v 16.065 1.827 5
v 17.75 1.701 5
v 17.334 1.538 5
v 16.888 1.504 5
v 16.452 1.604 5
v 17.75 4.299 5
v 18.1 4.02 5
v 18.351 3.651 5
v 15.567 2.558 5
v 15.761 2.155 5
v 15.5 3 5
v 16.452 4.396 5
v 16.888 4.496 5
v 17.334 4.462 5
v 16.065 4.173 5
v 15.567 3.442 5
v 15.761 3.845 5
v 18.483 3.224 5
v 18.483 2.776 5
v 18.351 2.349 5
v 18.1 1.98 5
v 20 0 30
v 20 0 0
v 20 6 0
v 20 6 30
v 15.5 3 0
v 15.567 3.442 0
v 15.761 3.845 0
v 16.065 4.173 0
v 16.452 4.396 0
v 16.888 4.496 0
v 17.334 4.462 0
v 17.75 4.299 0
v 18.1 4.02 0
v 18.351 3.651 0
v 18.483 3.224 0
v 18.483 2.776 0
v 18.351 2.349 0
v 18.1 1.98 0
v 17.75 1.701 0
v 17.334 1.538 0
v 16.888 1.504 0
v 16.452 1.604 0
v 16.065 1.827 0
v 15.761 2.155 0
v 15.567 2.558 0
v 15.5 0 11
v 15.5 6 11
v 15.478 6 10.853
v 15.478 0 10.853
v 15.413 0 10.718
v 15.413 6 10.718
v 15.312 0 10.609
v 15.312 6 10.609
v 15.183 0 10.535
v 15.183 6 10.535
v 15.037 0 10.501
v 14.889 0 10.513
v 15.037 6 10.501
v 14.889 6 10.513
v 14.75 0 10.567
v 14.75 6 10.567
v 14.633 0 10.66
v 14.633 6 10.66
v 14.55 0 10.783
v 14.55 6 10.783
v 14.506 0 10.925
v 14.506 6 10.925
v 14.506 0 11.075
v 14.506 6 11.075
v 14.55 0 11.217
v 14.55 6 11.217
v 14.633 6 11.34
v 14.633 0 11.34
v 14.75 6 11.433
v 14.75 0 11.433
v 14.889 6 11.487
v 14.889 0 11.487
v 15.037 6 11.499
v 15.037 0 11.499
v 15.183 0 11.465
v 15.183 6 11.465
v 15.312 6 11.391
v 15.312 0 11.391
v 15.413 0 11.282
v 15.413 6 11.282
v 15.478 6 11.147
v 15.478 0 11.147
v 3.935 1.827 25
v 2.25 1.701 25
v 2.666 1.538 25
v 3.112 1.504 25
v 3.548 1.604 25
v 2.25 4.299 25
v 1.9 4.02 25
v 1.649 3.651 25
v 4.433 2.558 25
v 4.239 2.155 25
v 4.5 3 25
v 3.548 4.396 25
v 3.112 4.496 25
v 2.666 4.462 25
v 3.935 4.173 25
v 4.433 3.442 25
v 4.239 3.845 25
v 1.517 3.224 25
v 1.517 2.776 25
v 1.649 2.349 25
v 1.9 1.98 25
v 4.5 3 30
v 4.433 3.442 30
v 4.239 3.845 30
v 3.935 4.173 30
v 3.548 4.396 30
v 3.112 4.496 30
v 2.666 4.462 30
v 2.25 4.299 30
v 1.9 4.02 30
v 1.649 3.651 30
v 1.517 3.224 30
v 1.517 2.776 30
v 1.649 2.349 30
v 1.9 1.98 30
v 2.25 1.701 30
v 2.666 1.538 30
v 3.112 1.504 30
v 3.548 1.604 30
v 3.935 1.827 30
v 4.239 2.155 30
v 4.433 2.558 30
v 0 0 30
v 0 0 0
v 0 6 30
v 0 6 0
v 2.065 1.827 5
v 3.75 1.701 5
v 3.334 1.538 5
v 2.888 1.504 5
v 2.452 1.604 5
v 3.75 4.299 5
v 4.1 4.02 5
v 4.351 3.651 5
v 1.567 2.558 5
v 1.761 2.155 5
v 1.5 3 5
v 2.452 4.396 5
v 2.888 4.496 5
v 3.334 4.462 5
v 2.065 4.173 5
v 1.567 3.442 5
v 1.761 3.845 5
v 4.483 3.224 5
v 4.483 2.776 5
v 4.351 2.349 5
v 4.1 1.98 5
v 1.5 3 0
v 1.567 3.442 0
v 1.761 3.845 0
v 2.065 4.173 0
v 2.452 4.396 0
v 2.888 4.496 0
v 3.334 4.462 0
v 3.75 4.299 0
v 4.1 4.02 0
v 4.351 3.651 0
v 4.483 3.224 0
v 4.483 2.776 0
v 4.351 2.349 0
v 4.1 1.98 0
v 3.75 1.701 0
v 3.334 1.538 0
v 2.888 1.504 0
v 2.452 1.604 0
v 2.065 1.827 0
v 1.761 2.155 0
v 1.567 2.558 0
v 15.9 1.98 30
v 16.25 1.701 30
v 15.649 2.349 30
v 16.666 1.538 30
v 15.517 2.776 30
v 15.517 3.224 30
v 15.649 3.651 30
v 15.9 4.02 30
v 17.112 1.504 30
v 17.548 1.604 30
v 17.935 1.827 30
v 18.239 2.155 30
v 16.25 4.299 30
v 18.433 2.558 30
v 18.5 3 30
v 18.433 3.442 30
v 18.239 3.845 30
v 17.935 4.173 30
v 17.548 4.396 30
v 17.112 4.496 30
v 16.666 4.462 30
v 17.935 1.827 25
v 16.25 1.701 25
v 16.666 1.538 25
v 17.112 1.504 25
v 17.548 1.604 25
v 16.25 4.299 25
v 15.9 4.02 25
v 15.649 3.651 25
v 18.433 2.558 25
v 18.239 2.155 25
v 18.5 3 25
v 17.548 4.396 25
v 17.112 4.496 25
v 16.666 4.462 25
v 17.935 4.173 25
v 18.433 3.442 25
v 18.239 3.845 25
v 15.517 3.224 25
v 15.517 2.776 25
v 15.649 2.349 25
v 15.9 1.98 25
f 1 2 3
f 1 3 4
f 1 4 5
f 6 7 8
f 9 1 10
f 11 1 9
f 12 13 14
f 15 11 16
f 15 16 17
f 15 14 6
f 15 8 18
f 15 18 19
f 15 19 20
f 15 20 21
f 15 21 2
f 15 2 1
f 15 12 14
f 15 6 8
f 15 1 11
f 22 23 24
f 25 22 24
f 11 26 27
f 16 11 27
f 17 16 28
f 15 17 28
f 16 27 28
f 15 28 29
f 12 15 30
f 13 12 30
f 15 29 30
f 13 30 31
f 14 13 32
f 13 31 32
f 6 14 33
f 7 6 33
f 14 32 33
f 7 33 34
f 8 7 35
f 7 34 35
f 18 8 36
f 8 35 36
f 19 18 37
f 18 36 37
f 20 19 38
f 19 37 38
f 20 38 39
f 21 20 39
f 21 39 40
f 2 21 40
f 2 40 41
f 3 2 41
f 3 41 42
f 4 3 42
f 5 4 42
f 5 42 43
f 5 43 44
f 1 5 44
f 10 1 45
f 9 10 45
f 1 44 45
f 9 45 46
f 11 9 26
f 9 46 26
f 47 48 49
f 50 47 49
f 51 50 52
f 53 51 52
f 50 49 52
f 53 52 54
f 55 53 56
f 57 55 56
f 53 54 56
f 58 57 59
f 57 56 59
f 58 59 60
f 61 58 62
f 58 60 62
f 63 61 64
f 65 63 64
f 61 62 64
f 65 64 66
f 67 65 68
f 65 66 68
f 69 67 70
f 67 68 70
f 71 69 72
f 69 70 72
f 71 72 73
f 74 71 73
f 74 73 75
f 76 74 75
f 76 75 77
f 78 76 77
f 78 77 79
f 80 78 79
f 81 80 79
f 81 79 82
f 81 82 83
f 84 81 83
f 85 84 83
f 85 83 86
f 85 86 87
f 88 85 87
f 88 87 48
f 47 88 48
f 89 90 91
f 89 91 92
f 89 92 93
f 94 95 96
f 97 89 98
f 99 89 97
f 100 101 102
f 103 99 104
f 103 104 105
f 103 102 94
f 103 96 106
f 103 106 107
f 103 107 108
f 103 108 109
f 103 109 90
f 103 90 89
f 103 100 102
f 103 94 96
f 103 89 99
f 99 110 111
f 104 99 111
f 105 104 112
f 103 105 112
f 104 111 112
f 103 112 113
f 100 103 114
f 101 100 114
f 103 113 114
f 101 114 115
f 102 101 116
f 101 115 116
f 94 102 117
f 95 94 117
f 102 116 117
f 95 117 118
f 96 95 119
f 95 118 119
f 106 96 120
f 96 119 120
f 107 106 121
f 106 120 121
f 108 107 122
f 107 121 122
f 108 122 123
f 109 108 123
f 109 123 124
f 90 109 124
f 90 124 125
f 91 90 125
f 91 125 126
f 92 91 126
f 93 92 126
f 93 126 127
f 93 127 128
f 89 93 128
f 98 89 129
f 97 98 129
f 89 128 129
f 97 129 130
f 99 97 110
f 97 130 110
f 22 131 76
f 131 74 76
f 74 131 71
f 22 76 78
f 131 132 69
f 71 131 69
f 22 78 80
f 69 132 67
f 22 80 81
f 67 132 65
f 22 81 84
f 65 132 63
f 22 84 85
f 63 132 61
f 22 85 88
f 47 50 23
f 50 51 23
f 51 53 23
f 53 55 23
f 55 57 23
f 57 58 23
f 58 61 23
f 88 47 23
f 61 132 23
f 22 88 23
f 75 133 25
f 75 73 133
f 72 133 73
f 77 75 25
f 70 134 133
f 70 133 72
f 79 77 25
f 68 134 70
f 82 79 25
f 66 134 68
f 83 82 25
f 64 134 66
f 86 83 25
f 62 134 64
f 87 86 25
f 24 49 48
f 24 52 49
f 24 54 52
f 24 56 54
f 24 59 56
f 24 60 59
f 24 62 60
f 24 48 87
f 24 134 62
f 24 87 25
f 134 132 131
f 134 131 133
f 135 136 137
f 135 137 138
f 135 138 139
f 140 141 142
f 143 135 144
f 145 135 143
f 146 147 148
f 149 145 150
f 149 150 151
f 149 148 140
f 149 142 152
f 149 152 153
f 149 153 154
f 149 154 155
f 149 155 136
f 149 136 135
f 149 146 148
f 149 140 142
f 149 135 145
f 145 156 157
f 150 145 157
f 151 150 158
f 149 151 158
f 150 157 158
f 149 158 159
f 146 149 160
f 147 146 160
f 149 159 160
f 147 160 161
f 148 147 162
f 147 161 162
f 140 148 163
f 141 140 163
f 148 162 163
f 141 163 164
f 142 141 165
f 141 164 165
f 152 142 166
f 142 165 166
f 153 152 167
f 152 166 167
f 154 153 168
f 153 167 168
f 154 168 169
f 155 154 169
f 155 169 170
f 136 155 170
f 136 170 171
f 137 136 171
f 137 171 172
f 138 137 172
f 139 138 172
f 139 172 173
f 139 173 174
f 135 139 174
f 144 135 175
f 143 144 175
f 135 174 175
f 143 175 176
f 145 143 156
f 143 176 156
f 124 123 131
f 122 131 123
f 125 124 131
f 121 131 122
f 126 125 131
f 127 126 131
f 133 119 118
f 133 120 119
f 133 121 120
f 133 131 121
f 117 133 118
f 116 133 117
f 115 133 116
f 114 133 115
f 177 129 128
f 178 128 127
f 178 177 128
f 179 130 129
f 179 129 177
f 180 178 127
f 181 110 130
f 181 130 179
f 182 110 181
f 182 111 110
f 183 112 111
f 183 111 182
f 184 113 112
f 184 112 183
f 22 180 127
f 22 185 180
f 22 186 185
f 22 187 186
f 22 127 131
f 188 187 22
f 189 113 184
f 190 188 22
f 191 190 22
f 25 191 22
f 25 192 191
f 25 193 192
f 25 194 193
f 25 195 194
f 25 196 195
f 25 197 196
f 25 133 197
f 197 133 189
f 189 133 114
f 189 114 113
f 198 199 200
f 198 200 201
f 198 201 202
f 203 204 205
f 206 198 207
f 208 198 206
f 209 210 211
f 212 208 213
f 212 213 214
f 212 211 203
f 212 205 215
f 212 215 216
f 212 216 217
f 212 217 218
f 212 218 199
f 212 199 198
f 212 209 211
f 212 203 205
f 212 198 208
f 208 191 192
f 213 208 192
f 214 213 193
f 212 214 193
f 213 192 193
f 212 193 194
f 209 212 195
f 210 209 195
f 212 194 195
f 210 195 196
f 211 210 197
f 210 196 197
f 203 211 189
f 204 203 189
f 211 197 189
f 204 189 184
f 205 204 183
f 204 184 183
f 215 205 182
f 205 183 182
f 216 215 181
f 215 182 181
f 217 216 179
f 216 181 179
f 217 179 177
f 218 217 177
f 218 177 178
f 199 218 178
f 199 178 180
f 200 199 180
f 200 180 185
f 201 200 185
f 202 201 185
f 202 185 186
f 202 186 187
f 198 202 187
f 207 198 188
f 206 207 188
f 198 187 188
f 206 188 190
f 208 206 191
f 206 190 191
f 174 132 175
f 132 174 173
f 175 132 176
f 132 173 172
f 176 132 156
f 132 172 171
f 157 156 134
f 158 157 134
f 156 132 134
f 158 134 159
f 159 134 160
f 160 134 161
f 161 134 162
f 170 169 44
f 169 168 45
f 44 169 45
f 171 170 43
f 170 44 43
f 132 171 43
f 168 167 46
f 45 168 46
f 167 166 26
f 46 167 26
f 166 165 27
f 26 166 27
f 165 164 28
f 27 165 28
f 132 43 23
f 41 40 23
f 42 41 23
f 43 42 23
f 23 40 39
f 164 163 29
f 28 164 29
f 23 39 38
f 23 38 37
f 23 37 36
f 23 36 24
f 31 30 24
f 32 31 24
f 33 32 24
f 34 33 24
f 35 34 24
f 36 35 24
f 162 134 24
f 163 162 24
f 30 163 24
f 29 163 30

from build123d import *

# Parameters (mm, degrees)
CROQUIS1_W              = 20
CROQUIS1_H              = 6
SALIENTE_EXTRUIR1_DEPTH = 30
CROQUIS2_R              = 1.5
CORTAR_EXTRUIR1_DEPTH   = 5
CROQUIS3_R              = 1.5
CORTAR_EXTRUIR3_DEPTH   = 5
CROQUIS4_R              = 0.5
CORTAR_EXTRUIR4_DEPTH   = 10


with BuildPart() as part:
    # Croquis1 → Saliente-Extruir1 (new body)
    with BuildSketch(Plane.XY):
        with Locations((10, 3)):
            Rectangle(CROQUIS1_W, CROQUIS1_H)
    extrude(amount=SALIENTE_EXTRUIR1_DEPTH)

    # Croquis2 → Cortar-Extruir1 (cut)
    with BuildSketch(Plane.XY.offset(30)):
        with Locations((3, 3)):
            Circle(CROQUIS2_R)
        with Locations((17, 3)):
            Circle(CROQUIS2_R)
    extrude(amount=-CORTAR_EXTRUIR1_DEPTH, mode=Mode.SUBTRACT)

    # Croquis3 → Cortar-Extruir3 (cut)
    with BuildSketch(Plane(origin=(0, 0, 0), x_dir=(-1, 0, 0), z_dir=(0, 0, -1))):
        with Locations((-17, 3)):
            Circle(CROQUIS3_R)
        with Locations((-3, 3)):
            Circle(CROQUIS3_R)
    extrude(amount=-CORTAR_EXTRUIR3_DEPTH, mode=Mode.SUBTRACT)

    # Croquis4 → Cortar-Extruir4 (cut)
    with BuildSketch(Plane(origin=(0, 6, 0), x_dir=(1, 0, 0), z_dir=(0, 1, 0))):
        with Locations((15, -11)):
            Circle(CROQUIS4_R)
    extrude(amount=-CORTAR_EXTRUIR4_DEPTH, mode=Mode.SUBTRACT)


solid = part.part
